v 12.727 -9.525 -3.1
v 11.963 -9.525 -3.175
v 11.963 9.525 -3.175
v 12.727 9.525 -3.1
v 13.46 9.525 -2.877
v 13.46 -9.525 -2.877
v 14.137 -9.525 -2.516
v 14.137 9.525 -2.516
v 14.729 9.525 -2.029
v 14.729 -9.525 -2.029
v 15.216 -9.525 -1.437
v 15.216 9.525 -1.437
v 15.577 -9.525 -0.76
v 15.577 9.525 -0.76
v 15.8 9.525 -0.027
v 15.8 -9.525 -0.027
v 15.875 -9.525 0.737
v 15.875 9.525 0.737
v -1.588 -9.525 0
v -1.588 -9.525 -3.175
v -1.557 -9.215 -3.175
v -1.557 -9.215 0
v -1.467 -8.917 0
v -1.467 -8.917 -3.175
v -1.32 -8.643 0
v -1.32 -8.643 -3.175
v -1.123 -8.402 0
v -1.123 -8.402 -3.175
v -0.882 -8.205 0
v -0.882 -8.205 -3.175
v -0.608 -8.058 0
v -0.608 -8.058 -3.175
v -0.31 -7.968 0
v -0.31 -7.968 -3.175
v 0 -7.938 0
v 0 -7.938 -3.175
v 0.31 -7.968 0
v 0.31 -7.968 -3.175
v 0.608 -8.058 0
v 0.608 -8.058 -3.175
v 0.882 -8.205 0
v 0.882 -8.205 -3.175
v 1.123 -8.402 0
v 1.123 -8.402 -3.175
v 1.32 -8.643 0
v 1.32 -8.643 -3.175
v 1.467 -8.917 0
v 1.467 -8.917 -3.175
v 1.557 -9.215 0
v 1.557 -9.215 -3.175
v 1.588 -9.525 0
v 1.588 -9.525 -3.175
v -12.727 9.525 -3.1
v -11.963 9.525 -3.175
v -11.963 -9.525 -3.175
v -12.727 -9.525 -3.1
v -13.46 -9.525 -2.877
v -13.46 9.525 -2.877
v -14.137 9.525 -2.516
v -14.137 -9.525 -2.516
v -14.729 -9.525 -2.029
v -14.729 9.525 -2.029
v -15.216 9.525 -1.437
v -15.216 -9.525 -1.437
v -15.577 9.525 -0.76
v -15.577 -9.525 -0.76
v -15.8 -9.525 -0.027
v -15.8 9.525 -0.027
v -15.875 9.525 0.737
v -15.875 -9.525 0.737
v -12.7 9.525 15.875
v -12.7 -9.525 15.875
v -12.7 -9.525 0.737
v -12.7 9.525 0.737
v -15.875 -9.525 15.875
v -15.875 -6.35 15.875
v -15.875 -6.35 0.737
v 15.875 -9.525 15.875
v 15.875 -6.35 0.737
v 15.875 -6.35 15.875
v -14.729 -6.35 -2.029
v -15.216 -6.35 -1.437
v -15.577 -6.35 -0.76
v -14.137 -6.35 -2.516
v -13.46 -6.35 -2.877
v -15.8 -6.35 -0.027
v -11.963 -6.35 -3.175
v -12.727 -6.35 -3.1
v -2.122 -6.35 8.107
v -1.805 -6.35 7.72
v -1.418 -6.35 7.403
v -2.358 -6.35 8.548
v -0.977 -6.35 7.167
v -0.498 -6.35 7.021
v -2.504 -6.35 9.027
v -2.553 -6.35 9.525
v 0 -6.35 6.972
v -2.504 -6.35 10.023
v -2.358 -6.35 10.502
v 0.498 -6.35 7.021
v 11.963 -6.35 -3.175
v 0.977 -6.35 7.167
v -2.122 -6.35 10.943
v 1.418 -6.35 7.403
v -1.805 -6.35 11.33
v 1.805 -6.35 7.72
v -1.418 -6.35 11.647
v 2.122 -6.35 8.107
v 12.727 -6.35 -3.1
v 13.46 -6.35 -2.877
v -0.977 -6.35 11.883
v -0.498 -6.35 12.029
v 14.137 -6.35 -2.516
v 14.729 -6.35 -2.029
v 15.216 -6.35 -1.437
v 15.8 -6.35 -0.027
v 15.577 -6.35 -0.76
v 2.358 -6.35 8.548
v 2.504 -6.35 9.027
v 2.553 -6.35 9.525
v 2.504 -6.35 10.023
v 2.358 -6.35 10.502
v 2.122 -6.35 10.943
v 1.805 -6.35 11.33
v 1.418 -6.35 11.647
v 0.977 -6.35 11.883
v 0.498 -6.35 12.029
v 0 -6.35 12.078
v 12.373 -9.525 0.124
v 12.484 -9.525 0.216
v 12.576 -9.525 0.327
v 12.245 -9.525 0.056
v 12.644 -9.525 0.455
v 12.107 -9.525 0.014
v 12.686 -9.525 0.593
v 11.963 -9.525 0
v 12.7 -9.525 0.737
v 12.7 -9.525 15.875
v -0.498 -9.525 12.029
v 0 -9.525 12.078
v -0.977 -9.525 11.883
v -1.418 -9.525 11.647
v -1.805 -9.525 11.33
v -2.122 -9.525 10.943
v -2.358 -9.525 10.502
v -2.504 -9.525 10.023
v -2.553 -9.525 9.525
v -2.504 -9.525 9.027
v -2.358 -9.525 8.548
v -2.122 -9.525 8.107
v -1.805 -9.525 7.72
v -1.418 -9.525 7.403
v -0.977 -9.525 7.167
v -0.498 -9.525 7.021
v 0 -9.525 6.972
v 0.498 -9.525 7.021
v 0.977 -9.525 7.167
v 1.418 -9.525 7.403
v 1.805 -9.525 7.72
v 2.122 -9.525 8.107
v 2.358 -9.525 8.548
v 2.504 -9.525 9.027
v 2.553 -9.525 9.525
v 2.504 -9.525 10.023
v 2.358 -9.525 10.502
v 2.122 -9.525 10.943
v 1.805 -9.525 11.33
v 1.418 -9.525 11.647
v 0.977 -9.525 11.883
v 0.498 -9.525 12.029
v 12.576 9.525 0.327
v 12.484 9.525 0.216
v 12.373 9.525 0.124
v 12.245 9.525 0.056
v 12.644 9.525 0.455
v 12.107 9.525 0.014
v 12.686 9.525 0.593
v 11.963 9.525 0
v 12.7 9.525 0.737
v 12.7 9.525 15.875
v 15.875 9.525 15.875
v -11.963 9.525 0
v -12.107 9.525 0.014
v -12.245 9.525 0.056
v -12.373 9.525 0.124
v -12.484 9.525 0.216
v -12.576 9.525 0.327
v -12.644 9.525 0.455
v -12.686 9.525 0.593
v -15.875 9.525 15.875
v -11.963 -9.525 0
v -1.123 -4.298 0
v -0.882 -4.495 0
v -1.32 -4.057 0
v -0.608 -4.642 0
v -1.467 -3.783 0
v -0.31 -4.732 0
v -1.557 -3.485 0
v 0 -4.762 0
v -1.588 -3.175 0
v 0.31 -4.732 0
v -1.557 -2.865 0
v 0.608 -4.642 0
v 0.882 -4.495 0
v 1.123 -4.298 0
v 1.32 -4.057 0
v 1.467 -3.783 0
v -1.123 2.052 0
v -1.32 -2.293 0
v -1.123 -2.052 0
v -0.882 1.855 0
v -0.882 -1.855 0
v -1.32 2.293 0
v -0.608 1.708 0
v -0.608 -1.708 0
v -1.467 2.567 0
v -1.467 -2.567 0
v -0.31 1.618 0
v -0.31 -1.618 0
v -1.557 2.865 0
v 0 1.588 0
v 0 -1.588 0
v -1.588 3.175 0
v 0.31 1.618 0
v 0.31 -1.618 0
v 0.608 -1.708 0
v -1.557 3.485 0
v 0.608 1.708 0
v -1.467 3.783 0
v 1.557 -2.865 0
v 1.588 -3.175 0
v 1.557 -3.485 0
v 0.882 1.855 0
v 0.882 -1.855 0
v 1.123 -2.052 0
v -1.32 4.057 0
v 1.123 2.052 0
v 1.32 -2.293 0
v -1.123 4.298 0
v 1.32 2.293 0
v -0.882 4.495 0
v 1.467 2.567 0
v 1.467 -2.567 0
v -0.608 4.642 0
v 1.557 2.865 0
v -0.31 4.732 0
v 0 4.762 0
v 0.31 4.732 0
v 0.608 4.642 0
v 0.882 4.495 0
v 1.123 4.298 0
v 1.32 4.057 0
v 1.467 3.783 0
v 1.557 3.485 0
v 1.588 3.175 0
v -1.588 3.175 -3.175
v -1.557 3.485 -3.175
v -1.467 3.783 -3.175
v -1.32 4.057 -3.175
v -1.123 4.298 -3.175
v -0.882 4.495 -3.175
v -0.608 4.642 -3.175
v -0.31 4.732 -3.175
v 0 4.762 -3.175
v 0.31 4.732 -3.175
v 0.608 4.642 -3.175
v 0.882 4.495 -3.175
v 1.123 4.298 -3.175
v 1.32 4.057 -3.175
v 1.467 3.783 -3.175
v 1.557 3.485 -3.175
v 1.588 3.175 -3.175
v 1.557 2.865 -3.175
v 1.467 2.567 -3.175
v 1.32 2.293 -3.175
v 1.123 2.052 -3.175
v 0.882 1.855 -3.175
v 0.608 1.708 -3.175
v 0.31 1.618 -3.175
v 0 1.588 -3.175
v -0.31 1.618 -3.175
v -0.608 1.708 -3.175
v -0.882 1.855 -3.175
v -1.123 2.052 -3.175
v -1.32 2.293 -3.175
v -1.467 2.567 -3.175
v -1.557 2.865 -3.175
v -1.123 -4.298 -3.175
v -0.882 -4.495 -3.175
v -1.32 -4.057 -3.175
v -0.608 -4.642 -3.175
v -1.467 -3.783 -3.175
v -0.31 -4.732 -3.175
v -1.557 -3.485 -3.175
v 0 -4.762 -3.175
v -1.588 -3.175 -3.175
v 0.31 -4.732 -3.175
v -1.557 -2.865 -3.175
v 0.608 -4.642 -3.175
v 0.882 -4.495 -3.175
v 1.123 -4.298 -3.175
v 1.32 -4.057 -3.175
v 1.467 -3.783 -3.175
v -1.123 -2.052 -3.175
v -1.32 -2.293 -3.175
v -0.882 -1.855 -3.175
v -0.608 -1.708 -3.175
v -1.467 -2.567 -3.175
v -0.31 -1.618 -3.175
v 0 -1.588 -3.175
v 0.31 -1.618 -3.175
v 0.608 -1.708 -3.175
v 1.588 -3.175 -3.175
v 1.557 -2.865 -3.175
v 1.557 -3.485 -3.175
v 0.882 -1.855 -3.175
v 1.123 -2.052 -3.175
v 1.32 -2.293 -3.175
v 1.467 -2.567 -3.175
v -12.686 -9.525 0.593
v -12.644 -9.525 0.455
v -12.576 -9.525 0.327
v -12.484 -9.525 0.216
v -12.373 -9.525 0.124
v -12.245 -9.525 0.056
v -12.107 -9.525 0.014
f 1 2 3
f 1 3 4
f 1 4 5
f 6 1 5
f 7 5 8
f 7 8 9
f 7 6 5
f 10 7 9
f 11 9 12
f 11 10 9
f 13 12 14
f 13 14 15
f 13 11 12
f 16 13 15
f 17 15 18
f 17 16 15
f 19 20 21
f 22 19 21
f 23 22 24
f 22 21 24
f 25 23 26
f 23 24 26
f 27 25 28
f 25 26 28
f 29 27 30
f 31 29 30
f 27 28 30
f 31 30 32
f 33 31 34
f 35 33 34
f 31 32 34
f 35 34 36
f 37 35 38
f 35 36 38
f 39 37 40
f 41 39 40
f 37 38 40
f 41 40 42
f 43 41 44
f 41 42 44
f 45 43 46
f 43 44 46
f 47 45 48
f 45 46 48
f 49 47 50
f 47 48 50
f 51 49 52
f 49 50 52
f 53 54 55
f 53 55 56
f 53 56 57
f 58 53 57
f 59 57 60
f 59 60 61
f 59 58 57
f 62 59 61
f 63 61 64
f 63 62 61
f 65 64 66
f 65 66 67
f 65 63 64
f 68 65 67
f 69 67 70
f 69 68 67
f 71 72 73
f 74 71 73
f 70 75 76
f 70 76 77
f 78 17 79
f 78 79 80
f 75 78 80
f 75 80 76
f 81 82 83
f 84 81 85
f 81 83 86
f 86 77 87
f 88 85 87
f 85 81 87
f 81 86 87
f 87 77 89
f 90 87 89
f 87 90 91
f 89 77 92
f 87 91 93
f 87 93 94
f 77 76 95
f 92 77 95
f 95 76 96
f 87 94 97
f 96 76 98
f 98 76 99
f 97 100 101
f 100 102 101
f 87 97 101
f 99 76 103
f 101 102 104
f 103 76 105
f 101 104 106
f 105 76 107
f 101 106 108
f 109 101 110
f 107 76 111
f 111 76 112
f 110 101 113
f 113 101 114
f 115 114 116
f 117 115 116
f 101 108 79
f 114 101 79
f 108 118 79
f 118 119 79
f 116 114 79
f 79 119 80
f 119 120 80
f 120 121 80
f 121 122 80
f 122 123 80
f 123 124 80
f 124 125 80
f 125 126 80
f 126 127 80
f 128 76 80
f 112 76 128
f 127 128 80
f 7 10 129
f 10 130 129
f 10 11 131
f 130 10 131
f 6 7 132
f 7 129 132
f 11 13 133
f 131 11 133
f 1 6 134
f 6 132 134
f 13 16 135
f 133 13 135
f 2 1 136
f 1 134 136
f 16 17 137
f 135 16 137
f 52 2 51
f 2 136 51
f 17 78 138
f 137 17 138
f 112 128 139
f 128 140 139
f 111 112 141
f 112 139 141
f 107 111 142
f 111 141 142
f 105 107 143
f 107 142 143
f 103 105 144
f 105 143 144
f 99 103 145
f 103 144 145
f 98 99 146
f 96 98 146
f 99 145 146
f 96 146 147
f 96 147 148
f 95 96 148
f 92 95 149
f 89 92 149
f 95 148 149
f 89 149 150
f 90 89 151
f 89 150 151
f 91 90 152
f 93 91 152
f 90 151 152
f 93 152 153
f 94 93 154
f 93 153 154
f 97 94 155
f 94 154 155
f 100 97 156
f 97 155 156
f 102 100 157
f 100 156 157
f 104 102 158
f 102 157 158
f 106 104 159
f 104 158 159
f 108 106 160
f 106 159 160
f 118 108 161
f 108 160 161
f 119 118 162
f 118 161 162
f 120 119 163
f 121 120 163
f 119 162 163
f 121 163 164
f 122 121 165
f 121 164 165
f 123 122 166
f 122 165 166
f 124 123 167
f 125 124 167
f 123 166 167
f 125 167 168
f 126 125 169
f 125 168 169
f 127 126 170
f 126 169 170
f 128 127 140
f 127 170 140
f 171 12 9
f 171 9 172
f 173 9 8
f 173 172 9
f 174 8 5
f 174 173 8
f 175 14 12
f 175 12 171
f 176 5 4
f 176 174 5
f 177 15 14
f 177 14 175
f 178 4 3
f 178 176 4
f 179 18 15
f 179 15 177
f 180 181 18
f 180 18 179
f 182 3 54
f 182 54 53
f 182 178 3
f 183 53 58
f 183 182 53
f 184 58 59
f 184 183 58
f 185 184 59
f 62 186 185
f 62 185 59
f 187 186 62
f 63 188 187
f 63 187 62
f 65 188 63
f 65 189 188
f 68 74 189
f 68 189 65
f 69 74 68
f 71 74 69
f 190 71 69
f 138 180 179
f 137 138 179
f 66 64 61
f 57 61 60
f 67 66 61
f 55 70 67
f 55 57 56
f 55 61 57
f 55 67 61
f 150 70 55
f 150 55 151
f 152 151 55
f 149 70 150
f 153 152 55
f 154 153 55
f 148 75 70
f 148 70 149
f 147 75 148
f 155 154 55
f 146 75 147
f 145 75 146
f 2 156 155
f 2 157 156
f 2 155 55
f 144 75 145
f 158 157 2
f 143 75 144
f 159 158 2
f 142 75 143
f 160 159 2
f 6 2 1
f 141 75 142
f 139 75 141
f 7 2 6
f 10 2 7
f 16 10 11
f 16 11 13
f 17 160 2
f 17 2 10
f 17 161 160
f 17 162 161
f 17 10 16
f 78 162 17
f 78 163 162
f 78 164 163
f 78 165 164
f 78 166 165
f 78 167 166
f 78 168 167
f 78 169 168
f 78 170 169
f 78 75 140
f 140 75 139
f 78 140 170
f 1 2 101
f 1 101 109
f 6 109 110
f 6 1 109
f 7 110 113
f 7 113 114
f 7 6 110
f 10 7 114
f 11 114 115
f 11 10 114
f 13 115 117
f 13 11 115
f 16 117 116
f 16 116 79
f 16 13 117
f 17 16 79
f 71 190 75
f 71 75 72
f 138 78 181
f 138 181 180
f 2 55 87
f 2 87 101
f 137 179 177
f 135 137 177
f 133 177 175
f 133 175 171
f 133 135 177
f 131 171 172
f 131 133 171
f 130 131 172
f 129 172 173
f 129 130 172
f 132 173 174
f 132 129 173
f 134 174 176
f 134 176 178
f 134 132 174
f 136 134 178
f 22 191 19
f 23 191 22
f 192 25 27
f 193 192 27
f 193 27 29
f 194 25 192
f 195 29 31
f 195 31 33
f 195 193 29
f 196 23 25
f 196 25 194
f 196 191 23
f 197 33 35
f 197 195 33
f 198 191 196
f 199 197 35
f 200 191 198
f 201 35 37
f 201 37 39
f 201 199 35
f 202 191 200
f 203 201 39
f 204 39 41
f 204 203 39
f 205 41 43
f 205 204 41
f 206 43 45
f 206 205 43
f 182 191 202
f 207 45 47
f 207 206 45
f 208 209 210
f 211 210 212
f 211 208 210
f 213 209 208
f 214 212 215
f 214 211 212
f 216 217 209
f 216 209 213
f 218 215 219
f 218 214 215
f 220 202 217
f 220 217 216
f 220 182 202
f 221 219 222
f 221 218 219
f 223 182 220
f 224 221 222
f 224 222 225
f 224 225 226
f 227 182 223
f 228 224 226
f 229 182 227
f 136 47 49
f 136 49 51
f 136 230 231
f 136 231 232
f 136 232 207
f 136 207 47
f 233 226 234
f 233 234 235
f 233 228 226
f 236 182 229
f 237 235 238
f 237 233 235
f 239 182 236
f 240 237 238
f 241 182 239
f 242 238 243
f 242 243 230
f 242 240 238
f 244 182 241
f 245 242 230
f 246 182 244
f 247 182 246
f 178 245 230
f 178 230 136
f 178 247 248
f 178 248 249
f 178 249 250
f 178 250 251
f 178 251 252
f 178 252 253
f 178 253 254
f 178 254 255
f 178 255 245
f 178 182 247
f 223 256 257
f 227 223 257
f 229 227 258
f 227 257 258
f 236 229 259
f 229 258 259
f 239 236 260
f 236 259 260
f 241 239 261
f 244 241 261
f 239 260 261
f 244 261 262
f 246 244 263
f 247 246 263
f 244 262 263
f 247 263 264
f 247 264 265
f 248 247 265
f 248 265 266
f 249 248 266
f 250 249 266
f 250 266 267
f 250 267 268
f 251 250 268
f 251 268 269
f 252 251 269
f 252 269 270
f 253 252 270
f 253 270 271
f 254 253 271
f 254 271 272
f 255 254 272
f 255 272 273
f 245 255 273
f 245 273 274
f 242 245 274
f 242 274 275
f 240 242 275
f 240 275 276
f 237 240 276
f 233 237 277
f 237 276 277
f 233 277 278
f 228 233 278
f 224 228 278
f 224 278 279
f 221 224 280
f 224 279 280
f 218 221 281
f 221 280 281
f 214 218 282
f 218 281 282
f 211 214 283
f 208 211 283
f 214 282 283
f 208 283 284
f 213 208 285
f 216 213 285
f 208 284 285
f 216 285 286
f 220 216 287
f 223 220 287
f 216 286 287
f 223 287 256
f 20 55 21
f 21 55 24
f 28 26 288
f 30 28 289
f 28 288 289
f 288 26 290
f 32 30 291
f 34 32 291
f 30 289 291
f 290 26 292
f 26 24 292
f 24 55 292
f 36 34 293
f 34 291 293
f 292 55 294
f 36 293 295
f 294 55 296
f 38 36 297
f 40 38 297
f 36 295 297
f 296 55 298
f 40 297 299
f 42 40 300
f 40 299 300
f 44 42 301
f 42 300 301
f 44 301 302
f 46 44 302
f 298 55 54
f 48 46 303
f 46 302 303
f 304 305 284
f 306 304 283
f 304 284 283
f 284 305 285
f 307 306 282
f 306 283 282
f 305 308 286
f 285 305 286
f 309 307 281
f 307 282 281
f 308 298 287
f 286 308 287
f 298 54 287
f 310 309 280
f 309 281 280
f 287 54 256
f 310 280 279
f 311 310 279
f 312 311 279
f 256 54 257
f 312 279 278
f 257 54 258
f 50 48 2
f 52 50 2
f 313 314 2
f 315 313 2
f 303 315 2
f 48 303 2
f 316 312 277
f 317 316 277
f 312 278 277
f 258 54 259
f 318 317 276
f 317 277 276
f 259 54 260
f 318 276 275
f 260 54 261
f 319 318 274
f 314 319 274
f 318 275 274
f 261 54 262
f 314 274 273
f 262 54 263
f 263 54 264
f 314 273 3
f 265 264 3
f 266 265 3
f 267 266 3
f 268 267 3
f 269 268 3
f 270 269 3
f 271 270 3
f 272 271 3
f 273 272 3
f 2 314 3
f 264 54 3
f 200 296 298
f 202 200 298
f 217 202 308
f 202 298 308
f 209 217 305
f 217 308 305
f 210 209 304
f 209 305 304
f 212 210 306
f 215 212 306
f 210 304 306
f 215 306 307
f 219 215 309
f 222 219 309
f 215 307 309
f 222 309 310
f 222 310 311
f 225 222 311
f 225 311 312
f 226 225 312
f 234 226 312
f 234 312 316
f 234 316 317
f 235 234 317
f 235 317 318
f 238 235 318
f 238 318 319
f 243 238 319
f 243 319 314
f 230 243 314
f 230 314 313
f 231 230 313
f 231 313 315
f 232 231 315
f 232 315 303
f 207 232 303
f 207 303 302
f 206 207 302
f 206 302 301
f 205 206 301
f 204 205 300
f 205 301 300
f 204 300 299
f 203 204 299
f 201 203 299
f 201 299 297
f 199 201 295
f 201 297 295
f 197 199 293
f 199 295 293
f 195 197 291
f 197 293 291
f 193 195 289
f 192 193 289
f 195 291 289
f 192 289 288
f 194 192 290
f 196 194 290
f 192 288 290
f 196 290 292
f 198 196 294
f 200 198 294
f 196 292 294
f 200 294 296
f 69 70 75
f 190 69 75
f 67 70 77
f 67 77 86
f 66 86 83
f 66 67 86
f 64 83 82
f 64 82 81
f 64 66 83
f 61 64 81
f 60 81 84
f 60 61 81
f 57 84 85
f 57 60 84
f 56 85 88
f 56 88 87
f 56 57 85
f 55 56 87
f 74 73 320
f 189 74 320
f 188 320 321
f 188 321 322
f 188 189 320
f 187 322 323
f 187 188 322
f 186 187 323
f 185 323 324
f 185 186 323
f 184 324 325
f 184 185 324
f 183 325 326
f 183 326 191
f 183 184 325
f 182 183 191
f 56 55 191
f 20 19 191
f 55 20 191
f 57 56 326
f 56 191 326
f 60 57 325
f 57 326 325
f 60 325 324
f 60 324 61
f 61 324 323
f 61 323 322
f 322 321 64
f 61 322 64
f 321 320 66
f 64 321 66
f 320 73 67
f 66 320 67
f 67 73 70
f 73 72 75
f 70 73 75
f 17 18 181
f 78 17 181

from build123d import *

# Parameters (mm, degrees)
SKETCH1_W                    = 25.4
SKETCH1_H                    = 19.05
BASE_FLANGE1_DEPTH           = 3.175
EDGE_FLANGE1_STRIP_W         = 14.1732
EDGE_FLANGE1_STRIP_H         = 3.175
EDGE_FLANGE1_STRIP_CUT_DEPTH = 19.05
EDGE_FLANGE1_DEPTH           = 19.05
EDGE_FLANGE2_STRIP_W         = 14.1732
EDGE_FLANGE2_STRIP_H         = 3.175
EDGE_FLANGE2_STRIP_CUT_DEPTH = 19.05
EDGE_FLANGE2_DEPTH           = 19.05
BASE_FLANGE2_DEPTH           = 3.175
SKETCH35_R                   = 1.5875
CUT_EXTRUDE2_DEPTH           = 27.563955842
SKETCH45_W                   = 2.5527
SKETCH45_H                   = 3.175


# Sheet-metal steps are written as plain solids
with BuildPart() as part:
    # Sketch1 → Base-Flange1 (new body)
    with BuildSketch(Plane.XY):
        Rectangle(SKETCH1_W, SKETCH1_H)
    extrude(amount=-BASE_FLANGE1_DEPTH)

    # Edge-Flange1 strip (across the edge) → Edge-Flange1 strip cut (cut)
    with BuildSketch(Plane(origin=(12.7, -9.525, 0), x_dir=(-1, 0, 0), z_dir=(0, 1, 0))):
        with Locations((-6.35, -1.5875)):
            Rectangle(EDGE_FLANGE1_STRIP_W, EDGE_FLANGE1_STRIP_H)
    extrude(amount=EDGE_FLANGE1_STRIP_CUT_DEPTH, mode=Mode.SUBTRACT)

    # Edge-Flange1 section (across the edge) → Edge-Flange1 (add)
    with BuildSketch(Plane(origin=(12.7, -9.525, 0), x_dir=(-1, 0, 0), z_dir=(0, 1, 0))):
        with BuildLine():
            Line((-3.175, 0.7366), (-3.175, 15.875))
            Line((-3.175, 15.875), (0, 15.875))
            Line((0, 15.875), (0, 0.7366))
            ThreePointArc((0, 0.7366), (0.215745145, 0.215745145), (0.7366, 0))
            Line((0.7366, 0), (0.7366, -3.175))
            ThreePointArc((0.7366, -3.175), (-2.029318885, -2.029318885), (-3.175, 0.7366))
        make_face()
    extrude(amount=EDGE_FLANGE1_DEPTH)

    # Edge-Flange2 strip (across the edge) → Edge-Flange2 strip cut (cut)
    with BuildSketch(Plane(origin=(-12.7, 9.525, 0), x_dir=(1, 0, 0), z_dir=(0, -1, 0))):
        with Locations((-6.35, -1.5875)):
            Rectangle(EDGE_FLANGE2_STRIP_W, EDGE_FLANGE2_STRIP_H)
    extrude(amount=EDGE_FLANGE2_STRIP_CUT_DEPTH, mode=Mode.SUBTRACT)

    # Edge-Flange2 section (across the edge) → Edge-Flange2 (add)
    with BuildSketch(Plane(origin=(-12.7, 9.525, 0), x_dir=(1, 0, 0), z_dir=(0, -1, 0))):
        with BuildLine():
            Line((-3.175, 0.7366), (-3.175, 15.875))
            Line((-3.175, 15.875), (0, 15.875))
            Line((0, 15.875), (0, 0.7366))
            ThreePointArc((0, 0.7366), (0.215745145, 0.215745145), (0.7366, 0))
            Line((0.7366, 0), (0.7366, -3.175))
            ThreePointArc((0.7366, -3.175), (-2.029318885, -2.029318885), (-3.175, 0.7366))
        make_face()
    extrude(amount=EDGE_FLANGE2_DEPTH)

    # Sketch35 → Cut-Extrude2 (cut, through all)
    with BuildSketch(Plane(origin=(0, 0, -3.175), x_dir=(-1, 0, 0), z_dir=(0, 0, -1))):
        with Locations((0, 3.175)):
            Circle(SKETCH35_R)
        with Locations((0, -3.175)):
            Circle(SKETCH35_R)
        with Locations((0, -9.525)):
            Circle(SKETCH35_R)
        with Locations((0, -15.875)):
            Circle(SKETCH35_R)
        with Locations((0, -22.225)):
            Circle(SKETCH35_R)
    extrude(amount=-CUT_EXTRUDE2_DEPTH, mode=Mode.SUBTRACT)


with BuildPart() as body_2:
    # Sketch32 → Base-Flange2 (new body)
    with BuildSketch(Plane.XZ.offset(9.525)):
        with BuildLine():
            Line((-15.875, 15.875), (-15.875, 0.7366))
            ThreePointArc((-15.875, 0.7366), (-14.729318885, -2.029318885), (-11.9634, -3.175))
            Line((-11.9634, -3.175), (11.9634, -3.175))
            ThreePointArc((11.9634, -3.175), (14.729318885, -2.029318885), (15.875, 0.7366))
            Line((15.875, 0.7366), (15.875, 15.875))
            Line((15.875, 15.875), (-15.875, 15.875))
        make_face()
    extrude(amount=-BASE_FLANGE2_DEPTH)

    # Sketch45 → Tap Drill for 1/4-20 Tap1 (revolve, cut)
    with BuildSketch(Plane(origin=(0, -6.35, 9.525), x_dir=(0, 0, 1), z_dir=(1, 0, 0))):
        with Locations((1.27635, 1.5875)):
            Rectangle(SKETCH45_W, SKETCH45_H)
    revolve(axis=Axis((0, 0, 9.525), (0, -1, 0)), mode=Mode.SUBTRACT)


solid = Compound([part.part, body_2.part])
